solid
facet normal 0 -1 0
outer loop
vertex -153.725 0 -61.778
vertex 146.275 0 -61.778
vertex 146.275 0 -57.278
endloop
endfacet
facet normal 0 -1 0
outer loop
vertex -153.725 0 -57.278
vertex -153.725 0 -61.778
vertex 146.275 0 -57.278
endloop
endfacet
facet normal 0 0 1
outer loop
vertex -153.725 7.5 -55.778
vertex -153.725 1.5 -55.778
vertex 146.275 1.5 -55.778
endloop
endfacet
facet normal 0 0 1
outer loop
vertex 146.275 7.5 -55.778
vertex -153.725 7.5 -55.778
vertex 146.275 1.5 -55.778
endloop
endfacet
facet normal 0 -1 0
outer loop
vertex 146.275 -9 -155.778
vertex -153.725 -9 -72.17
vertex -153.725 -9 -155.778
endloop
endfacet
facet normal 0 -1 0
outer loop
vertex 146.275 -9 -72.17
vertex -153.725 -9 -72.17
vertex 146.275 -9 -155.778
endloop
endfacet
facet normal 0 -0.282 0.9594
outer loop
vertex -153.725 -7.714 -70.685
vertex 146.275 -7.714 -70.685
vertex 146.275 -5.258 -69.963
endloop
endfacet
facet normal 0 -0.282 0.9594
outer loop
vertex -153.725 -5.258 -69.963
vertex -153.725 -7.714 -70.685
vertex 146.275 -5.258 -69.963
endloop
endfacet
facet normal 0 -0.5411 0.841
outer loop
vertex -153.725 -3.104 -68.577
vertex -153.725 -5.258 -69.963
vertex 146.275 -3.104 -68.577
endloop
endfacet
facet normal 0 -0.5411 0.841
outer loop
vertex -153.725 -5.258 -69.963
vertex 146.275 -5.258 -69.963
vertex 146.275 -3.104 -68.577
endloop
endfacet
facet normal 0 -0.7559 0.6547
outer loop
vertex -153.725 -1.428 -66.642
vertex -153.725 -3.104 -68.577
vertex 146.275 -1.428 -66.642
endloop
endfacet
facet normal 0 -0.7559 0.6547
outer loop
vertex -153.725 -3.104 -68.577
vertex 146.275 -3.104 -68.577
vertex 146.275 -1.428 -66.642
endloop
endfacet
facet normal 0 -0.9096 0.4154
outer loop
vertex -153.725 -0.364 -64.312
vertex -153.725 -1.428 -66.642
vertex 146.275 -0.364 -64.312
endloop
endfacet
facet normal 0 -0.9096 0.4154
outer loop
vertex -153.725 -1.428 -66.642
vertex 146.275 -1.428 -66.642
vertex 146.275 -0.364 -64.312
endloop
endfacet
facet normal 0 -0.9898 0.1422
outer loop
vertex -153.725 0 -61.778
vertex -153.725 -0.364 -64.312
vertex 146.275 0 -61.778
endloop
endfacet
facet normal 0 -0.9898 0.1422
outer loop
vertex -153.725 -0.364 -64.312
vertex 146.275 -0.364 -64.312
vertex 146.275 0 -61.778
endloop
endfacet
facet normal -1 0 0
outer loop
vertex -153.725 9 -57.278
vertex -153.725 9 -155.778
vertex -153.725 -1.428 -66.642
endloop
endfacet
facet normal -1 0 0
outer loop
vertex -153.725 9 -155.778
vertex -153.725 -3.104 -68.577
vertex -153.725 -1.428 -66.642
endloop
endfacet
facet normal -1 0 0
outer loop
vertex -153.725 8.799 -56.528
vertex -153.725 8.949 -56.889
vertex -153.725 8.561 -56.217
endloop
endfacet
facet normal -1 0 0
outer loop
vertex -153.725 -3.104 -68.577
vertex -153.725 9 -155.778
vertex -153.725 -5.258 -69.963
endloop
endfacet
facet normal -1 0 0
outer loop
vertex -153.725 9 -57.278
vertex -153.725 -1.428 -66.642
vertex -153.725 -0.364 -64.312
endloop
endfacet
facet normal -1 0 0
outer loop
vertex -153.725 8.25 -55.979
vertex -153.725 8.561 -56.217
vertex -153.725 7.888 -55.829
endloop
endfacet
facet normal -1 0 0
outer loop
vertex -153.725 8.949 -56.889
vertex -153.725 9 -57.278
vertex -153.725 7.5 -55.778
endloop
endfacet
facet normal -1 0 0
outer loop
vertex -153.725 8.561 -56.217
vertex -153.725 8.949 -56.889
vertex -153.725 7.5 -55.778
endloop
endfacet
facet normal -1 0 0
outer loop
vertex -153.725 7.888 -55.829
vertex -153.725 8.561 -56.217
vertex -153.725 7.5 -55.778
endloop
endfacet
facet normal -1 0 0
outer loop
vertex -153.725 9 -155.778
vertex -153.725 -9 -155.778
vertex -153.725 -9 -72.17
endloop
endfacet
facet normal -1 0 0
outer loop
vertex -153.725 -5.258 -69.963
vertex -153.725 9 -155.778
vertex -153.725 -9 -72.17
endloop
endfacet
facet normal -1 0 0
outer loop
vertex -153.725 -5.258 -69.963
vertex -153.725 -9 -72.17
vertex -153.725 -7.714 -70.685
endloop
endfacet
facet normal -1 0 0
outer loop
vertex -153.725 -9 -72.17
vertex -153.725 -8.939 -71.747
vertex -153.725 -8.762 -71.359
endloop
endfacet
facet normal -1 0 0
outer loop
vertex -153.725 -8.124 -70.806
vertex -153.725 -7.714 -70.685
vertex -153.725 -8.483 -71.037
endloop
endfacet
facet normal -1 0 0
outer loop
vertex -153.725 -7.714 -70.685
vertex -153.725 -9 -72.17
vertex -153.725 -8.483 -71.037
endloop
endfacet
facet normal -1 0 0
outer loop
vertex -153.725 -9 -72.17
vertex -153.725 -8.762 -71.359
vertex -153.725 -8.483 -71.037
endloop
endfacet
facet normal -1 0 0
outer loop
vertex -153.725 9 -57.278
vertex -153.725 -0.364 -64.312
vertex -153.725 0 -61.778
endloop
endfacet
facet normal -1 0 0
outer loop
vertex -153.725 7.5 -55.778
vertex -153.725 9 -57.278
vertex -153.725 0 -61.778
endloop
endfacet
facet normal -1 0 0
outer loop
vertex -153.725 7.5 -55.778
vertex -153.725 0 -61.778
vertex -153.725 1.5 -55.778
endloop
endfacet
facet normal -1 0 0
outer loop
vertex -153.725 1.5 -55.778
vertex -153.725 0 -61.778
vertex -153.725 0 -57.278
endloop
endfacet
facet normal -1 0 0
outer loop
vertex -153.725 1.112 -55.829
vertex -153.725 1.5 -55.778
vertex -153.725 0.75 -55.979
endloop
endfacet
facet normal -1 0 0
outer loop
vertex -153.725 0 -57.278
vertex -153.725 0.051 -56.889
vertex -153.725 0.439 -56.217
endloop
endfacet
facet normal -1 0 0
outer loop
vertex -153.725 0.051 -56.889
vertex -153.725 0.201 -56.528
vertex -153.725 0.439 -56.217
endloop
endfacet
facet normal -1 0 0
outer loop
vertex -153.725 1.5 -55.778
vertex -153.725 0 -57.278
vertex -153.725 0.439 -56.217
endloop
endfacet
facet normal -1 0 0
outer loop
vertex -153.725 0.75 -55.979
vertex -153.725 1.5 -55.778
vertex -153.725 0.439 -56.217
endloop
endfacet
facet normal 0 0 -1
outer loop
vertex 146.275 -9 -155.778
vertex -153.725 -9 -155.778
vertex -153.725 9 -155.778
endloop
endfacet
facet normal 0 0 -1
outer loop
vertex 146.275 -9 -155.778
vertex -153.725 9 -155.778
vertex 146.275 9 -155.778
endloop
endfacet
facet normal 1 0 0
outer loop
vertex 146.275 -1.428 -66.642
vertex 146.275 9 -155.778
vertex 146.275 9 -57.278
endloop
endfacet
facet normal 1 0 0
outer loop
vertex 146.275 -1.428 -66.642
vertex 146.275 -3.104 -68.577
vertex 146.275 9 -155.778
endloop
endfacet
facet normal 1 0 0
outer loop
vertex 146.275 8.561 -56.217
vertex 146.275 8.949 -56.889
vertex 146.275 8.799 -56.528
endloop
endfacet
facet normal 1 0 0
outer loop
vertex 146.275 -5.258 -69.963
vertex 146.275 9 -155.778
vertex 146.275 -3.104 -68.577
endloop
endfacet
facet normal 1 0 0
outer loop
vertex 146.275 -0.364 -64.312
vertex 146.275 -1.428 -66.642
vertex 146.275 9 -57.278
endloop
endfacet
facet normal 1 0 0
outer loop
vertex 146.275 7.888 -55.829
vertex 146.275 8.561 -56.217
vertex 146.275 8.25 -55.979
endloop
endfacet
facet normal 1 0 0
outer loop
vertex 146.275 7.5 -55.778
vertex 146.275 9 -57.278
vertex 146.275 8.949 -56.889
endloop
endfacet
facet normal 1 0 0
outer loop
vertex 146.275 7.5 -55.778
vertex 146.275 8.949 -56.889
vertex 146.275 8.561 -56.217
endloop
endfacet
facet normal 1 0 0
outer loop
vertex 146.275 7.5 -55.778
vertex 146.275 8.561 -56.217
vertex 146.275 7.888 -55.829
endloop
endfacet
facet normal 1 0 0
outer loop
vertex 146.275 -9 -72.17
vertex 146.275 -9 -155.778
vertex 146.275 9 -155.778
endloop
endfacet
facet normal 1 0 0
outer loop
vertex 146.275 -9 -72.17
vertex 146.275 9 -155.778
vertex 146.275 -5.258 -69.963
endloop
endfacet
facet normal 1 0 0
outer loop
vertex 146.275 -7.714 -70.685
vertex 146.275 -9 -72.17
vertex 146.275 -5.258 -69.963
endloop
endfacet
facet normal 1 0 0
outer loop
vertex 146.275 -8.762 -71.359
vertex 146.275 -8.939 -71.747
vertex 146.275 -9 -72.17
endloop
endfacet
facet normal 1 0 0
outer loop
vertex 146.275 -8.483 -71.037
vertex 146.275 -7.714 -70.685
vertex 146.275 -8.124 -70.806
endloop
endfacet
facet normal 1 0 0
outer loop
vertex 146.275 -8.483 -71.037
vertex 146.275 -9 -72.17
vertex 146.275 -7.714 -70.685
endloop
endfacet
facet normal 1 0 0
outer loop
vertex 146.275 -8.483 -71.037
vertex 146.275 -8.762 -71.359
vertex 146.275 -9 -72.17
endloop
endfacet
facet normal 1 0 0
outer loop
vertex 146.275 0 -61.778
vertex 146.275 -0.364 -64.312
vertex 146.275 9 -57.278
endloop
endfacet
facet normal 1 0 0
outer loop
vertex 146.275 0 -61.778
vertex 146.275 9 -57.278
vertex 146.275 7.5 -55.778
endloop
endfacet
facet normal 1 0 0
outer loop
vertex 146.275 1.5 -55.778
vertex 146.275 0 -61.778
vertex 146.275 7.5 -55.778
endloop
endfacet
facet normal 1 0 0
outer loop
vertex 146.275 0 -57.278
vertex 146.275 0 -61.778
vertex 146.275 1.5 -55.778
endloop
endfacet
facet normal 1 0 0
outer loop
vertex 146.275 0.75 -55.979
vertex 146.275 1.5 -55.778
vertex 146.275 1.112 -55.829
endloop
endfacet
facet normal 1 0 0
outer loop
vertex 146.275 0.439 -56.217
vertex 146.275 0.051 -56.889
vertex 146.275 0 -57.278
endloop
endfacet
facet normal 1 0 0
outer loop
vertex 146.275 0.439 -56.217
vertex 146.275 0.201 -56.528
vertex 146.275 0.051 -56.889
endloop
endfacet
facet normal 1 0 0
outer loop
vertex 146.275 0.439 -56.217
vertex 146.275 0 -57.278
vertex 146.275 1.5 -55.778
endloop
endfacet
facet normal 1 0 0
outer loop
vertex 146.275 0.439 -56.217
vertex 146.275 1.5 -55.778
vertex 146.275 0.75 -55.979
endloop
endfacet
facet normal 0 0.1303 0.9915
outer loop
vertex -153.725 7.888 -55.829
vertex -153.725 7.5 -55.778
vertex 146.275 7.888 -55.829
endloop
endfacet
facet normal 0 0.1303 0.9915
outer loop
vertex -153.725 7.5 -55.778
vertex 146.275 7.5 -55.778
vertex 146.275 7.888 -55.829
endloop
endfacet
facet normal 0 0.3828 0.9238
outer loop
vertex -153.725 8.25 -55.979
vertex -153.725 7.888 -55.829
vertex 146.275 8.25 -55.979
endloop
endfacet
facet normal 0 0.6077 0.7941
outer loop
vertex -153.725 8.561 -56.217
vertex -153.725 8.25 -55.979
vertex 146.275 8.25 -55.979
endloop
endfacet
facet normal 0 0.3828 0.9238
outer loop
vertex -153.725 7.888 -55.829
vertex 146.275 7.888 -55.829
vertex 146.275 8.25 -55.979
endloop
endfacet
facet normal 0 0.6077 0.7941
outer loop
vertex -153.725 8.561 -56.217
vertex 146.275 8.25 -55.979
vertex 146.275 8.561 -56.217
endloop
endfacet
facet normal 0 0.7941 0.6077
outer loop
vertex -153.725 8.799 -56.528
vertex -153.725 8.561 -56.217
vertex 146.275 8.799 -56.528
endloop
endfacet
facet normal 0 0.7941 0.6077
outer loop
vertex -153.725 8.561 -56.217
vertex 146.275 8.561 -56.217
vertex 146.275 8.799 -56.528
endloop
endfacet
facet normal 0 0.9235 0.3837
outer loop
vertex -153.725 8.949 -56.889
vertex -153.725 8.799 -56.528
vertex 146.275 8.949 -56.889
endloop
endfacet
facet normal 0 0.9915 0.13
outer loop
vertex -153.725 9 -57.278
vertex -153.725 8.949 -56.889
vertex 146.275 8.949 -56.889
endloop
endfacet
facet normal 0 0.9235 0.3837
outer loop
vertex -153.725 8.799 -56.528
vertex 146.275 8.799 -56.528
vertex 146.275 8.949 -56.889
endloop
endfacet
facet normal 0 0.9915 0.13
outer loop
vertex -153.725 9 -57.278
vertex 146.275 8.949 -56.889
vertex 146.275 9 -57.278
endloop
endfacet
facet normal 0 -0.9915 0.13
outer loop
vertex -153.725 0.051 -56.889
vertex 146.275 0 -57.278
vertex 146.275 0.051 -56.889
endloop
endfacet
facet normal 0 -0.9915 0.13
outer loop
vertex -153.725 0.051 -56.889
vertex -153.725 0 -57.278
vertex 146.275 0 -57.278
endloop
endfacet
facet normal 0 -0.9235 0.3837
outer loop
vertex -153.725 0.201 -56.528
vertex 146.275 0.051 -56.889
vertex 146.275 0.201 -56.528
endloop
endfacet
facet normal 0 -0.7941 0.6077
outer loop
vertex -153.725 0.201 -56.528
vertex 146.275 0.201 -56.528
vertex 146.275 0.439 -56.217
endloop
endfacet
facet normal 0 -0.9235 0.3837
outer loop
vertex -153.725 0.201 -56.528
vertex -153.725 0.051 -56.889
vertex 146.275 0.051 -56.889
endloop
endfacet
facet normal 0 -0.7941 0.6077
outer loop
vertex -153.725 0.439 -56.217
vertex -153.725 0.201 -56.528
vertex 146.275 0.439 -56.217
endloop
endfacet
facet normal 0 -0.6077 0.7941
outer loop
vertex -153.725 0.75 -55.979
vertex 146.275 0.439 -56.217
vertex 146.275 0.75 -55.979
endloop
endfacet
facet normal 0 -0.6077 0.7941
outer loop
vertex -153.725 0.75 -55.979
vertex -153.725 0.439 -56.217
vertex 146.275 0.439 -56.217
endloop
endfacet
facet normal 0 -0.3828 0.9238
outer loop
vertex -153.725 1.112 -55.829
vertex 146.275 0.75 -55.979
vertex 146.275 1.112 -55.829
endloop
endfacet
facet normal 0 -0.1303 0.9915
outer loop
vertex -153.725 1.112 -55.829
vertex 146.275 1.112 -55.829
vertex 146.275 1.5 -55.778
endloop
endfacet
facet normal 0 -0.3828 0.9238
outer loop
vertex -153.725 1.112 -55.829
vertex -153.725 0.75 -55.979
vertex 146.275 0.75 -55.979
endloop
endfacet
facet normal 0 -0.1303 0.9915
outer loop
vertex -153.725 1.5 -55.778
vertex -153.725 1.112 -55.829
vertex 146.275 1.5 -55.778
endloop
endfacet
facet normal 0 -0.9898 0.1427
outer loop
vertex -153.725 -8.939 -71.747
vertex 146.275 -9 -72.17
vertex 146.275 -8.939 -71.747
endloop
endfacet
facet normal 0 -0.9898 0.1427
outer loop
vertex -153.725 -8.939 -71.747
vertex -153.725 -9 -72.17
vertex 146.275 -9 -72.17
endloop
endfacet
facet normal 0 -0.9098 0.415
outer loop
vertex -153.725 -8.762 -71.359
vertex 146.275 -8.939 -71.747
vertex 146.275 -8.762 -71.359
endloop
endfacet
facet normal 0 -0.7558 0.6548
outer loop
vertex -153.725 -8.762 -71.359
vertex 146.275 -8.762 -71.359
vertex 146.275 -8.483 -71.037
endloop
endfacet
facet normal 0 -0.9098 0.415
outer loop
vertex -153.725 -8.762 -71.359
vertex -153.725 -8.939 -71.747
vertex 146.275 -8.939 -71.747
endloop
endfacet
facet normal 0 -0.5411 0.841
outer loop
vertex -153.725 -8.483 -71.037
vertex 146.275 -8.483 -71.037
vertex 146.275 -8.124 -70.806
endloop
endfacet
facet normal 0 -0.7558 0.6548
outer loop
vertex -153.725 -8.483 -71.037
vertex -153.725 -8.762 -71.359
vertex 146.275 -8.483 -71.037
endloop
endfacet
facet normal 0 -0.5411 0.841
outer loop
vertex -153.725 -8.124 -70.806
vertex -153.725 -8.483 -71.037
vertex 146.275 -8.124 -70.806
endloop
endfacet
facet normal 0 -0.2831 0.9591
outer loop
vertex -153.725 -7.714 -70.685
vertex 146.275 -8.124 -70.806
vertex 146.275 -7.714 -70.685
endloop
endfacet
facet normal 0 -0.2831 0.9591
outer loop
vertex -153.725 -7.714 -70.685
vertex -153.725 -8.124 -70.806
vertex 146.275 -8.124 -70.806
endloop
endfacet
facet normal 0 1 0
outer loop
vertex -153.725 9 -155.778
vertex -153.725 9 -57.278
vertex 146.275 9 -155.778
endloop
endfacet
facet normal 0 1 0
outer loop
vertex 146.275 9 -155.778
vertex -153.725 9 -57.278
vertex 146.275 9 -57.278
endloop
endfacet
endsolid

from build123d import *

# Parameters (mm, degrees)
F0_W     = 300
F0_H     = 100
F1_DEPTH = 9
F3_DEPTH = 300.001
F4_R     = 1.5


with BuildPart() as f1:
    # F0 (on Front) → F1 (new body, symmetric)
    with BuildSketch(Plane.XZ):
        with Locations((-3.7248600274, -105.7776198197)):
            Rectangle(F0_W, F0_H)
    extrude(amount=F1_DEPTH, both=True)

    # F2 (on face) → F3 (cut, through all)
    with BuildSketch(Plane.YZ.offset(146.2751399726)):
        with BuildLine():
            Line((0, -61.7776198197), (0, -55.7776198197))
            Line((0, -55.7776198197), (-9, -55.7776198197))
            Line((-9, -55.7776198197), (-9, -70.7776198197))
            ThreePointArc((-9, -70.7776198197), (-2.6360389693, -68.1415808503), (0, -61.7776198197))
        make_face()
    extrude(amount=-F3_DEPTH, mode=Mode.SUBTRACT)

    # F4
    f4_edges = [f1.edges().sort_by_distance(p)[0] for p in [
        (-3.72486, 0, -55.77762),
        (-3.72486, 9, -55.77762),
        (-3.72486, -9, -70.77762),
    ]]
    fillet(f4_edges, radius=F4_R)


solid = f1.part
